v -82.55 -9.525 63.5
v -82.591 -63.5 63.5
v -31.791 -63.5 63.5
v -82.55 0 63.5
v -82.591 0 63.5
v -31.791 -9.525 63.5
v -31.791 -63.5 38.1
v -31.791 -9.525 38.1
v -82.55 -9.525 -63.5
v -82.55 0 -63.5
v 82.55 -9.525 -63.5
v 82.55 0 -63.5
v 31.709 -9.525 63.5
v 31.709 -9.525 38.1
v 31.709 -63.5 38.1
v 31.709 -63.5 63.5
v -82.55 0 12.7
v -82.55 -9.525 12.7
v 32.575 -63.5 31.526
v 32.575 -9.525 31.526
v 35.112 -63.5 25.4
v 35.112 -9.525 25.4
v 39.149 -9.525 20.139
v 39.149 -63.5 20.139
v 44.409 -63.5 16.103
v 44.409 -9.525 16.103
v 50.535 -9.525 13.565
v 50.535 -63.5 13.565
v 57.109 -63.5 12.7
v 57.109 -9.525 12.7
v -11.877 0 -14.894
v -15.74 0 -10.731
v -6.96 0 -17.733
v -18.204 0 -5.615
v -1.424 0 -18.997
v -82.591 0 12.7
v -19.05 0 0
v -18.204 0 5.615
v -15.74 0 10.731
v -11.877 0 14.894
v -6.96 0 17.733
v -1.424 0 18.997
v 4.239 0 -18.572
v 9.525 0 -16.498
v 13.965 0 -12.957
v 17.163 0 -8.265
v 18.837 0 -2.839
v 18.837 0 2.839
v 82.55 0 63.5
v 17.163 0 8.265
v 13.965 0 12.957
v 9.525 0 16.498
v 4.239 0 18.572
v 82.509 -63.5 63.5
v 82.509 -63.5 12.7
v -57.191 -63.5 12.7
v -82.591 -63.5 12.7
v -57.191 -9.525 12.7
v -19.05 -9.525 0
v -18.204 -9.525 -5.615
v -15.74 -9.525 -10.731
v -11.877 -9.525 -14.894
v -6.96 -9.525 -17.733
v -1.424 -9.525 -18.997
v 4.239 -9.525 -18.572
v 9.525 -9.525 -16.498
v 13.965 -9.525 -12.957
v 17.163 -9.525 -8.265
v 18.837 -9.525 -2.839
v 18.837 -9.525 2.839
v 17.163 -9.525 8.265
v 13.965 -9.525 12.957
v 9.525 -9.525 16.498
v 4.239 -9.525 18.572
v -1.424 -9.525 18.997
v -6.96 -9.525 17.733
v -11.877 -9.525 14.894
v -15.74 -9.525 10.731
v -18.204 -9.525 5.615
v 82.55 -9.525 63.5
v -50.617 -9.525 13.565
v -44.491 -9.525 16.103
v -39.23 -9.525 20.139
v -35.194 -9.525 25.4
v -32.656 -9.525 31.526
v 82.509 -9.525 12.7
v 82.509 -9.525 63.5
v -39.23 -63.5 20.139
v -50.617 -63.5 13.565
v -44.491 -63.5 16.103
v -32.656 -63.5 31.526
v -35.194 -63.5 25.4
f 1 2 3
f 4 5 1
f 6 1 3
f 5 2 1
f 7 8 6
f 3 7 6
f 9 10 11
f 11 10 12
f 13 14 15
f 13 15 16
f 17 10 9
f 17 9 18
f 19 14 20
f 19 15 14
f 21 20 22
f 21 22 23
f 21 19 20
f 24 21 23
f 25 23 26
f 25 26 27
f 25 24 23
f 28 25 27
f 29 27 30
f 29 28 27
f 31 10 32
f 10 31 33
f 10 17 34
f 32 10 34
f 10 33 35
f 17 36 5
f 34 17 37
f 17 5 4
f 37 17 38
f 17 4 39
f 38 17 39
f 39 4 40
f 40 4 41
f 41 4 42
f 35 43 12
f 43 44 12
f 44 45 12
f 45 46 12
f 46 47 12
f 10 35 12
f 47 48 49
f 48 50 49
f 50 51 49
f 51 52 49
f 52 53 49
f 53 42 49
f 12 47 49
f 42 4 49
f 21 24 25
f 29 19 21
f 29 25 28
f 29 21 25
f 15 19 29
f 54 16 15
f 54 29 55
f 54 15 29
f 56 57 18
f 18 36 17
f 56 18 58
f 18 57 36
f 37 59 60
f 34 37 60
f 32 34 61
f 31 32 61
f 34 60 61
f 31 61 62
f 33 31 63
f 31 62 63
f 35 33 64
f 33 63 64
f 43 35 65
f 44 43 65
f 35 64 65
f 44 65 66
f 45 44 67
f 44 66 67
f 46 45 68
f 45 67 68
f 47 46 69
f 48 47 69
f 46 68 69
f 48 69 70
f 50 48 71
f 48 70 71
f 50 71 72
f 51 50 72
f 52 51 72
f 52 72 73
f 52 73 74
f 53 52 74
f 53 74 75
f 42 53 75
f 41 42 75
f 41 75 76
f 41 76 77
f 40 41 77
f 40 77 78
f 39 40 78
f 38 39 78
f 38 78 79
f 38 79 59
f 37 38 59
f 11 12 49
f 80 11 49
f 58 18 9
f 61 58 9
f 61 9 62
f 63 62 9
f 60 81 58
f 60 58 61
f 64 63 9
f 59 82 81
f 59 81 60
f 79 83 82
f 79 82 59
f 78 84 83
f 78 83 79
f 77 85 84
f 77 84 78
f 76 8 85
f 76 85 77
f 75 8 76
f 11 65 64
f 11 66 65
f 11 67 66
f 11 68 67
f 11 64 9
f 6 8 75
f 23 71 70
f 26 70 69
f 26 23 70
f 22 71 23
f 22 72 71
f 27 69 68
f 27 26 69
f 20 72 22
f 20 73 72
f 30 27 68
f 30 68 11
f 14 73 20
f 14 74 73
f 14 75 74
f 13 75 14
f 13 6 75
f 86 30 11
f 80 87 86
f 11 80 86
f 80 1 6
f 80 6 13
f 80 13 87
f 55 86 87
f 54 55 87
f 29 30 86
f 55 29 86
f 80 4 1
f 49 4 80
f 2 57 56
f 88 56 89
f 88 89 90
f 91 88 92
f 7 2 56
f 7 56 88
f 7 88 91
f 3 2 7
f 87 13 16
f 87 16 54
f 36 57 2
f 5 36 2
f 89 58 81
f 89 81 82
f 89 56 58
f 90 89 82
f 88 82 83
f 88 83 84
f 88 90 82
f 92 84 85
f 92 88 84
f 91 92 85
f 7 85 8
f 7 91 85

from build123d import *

# Parameters (mm, degrees)
F0_W     = 165.1
F0_H     = 127
F1_DEPTH = 9.525
F2_D     = 38.1
F3_W     = 50.8
F3_H     = 50.8
F4_DEPTH = 63.5
F5_R     = 25.4


with BuildPart() as f1:
    # F0 (on Front) → F1 (new body)
    with BuildSketch(Plane.XZ):
        Rectangle(F0_W, F0_H)
    extrude(amount=F1_DEPTH)

    # F2 (through all)
    with Locations(Plane(origin=(0, 0, 0), x_dir=(1, 0, 0), z_dir=(0, 1, 0))):
        with Locations((0, 0)):
            Hole(F2_D / 2)

    # F3 (on Front) → F4 (join)
    with BuildSketch(Plane.XZ):
        with Locations((-57.190858, 38.099989)):
            Rectangle(F3_W, F3_H)
        with Locations((57.109142, 38.099989)):
            Rectangle(F3_W, F3_H)
    extrude(amount=F4_DEPTH)

    # F5
    f5_edges = [f1.edges().sort_by_distance(p)[0] for p in [
        (-31.790858, -36.5125, 12.699989),
        (31.709142, -36.5125, 12.699989),
    ]]
    fillet(f5_edges, radius=F5_R)


solid = f1.part
